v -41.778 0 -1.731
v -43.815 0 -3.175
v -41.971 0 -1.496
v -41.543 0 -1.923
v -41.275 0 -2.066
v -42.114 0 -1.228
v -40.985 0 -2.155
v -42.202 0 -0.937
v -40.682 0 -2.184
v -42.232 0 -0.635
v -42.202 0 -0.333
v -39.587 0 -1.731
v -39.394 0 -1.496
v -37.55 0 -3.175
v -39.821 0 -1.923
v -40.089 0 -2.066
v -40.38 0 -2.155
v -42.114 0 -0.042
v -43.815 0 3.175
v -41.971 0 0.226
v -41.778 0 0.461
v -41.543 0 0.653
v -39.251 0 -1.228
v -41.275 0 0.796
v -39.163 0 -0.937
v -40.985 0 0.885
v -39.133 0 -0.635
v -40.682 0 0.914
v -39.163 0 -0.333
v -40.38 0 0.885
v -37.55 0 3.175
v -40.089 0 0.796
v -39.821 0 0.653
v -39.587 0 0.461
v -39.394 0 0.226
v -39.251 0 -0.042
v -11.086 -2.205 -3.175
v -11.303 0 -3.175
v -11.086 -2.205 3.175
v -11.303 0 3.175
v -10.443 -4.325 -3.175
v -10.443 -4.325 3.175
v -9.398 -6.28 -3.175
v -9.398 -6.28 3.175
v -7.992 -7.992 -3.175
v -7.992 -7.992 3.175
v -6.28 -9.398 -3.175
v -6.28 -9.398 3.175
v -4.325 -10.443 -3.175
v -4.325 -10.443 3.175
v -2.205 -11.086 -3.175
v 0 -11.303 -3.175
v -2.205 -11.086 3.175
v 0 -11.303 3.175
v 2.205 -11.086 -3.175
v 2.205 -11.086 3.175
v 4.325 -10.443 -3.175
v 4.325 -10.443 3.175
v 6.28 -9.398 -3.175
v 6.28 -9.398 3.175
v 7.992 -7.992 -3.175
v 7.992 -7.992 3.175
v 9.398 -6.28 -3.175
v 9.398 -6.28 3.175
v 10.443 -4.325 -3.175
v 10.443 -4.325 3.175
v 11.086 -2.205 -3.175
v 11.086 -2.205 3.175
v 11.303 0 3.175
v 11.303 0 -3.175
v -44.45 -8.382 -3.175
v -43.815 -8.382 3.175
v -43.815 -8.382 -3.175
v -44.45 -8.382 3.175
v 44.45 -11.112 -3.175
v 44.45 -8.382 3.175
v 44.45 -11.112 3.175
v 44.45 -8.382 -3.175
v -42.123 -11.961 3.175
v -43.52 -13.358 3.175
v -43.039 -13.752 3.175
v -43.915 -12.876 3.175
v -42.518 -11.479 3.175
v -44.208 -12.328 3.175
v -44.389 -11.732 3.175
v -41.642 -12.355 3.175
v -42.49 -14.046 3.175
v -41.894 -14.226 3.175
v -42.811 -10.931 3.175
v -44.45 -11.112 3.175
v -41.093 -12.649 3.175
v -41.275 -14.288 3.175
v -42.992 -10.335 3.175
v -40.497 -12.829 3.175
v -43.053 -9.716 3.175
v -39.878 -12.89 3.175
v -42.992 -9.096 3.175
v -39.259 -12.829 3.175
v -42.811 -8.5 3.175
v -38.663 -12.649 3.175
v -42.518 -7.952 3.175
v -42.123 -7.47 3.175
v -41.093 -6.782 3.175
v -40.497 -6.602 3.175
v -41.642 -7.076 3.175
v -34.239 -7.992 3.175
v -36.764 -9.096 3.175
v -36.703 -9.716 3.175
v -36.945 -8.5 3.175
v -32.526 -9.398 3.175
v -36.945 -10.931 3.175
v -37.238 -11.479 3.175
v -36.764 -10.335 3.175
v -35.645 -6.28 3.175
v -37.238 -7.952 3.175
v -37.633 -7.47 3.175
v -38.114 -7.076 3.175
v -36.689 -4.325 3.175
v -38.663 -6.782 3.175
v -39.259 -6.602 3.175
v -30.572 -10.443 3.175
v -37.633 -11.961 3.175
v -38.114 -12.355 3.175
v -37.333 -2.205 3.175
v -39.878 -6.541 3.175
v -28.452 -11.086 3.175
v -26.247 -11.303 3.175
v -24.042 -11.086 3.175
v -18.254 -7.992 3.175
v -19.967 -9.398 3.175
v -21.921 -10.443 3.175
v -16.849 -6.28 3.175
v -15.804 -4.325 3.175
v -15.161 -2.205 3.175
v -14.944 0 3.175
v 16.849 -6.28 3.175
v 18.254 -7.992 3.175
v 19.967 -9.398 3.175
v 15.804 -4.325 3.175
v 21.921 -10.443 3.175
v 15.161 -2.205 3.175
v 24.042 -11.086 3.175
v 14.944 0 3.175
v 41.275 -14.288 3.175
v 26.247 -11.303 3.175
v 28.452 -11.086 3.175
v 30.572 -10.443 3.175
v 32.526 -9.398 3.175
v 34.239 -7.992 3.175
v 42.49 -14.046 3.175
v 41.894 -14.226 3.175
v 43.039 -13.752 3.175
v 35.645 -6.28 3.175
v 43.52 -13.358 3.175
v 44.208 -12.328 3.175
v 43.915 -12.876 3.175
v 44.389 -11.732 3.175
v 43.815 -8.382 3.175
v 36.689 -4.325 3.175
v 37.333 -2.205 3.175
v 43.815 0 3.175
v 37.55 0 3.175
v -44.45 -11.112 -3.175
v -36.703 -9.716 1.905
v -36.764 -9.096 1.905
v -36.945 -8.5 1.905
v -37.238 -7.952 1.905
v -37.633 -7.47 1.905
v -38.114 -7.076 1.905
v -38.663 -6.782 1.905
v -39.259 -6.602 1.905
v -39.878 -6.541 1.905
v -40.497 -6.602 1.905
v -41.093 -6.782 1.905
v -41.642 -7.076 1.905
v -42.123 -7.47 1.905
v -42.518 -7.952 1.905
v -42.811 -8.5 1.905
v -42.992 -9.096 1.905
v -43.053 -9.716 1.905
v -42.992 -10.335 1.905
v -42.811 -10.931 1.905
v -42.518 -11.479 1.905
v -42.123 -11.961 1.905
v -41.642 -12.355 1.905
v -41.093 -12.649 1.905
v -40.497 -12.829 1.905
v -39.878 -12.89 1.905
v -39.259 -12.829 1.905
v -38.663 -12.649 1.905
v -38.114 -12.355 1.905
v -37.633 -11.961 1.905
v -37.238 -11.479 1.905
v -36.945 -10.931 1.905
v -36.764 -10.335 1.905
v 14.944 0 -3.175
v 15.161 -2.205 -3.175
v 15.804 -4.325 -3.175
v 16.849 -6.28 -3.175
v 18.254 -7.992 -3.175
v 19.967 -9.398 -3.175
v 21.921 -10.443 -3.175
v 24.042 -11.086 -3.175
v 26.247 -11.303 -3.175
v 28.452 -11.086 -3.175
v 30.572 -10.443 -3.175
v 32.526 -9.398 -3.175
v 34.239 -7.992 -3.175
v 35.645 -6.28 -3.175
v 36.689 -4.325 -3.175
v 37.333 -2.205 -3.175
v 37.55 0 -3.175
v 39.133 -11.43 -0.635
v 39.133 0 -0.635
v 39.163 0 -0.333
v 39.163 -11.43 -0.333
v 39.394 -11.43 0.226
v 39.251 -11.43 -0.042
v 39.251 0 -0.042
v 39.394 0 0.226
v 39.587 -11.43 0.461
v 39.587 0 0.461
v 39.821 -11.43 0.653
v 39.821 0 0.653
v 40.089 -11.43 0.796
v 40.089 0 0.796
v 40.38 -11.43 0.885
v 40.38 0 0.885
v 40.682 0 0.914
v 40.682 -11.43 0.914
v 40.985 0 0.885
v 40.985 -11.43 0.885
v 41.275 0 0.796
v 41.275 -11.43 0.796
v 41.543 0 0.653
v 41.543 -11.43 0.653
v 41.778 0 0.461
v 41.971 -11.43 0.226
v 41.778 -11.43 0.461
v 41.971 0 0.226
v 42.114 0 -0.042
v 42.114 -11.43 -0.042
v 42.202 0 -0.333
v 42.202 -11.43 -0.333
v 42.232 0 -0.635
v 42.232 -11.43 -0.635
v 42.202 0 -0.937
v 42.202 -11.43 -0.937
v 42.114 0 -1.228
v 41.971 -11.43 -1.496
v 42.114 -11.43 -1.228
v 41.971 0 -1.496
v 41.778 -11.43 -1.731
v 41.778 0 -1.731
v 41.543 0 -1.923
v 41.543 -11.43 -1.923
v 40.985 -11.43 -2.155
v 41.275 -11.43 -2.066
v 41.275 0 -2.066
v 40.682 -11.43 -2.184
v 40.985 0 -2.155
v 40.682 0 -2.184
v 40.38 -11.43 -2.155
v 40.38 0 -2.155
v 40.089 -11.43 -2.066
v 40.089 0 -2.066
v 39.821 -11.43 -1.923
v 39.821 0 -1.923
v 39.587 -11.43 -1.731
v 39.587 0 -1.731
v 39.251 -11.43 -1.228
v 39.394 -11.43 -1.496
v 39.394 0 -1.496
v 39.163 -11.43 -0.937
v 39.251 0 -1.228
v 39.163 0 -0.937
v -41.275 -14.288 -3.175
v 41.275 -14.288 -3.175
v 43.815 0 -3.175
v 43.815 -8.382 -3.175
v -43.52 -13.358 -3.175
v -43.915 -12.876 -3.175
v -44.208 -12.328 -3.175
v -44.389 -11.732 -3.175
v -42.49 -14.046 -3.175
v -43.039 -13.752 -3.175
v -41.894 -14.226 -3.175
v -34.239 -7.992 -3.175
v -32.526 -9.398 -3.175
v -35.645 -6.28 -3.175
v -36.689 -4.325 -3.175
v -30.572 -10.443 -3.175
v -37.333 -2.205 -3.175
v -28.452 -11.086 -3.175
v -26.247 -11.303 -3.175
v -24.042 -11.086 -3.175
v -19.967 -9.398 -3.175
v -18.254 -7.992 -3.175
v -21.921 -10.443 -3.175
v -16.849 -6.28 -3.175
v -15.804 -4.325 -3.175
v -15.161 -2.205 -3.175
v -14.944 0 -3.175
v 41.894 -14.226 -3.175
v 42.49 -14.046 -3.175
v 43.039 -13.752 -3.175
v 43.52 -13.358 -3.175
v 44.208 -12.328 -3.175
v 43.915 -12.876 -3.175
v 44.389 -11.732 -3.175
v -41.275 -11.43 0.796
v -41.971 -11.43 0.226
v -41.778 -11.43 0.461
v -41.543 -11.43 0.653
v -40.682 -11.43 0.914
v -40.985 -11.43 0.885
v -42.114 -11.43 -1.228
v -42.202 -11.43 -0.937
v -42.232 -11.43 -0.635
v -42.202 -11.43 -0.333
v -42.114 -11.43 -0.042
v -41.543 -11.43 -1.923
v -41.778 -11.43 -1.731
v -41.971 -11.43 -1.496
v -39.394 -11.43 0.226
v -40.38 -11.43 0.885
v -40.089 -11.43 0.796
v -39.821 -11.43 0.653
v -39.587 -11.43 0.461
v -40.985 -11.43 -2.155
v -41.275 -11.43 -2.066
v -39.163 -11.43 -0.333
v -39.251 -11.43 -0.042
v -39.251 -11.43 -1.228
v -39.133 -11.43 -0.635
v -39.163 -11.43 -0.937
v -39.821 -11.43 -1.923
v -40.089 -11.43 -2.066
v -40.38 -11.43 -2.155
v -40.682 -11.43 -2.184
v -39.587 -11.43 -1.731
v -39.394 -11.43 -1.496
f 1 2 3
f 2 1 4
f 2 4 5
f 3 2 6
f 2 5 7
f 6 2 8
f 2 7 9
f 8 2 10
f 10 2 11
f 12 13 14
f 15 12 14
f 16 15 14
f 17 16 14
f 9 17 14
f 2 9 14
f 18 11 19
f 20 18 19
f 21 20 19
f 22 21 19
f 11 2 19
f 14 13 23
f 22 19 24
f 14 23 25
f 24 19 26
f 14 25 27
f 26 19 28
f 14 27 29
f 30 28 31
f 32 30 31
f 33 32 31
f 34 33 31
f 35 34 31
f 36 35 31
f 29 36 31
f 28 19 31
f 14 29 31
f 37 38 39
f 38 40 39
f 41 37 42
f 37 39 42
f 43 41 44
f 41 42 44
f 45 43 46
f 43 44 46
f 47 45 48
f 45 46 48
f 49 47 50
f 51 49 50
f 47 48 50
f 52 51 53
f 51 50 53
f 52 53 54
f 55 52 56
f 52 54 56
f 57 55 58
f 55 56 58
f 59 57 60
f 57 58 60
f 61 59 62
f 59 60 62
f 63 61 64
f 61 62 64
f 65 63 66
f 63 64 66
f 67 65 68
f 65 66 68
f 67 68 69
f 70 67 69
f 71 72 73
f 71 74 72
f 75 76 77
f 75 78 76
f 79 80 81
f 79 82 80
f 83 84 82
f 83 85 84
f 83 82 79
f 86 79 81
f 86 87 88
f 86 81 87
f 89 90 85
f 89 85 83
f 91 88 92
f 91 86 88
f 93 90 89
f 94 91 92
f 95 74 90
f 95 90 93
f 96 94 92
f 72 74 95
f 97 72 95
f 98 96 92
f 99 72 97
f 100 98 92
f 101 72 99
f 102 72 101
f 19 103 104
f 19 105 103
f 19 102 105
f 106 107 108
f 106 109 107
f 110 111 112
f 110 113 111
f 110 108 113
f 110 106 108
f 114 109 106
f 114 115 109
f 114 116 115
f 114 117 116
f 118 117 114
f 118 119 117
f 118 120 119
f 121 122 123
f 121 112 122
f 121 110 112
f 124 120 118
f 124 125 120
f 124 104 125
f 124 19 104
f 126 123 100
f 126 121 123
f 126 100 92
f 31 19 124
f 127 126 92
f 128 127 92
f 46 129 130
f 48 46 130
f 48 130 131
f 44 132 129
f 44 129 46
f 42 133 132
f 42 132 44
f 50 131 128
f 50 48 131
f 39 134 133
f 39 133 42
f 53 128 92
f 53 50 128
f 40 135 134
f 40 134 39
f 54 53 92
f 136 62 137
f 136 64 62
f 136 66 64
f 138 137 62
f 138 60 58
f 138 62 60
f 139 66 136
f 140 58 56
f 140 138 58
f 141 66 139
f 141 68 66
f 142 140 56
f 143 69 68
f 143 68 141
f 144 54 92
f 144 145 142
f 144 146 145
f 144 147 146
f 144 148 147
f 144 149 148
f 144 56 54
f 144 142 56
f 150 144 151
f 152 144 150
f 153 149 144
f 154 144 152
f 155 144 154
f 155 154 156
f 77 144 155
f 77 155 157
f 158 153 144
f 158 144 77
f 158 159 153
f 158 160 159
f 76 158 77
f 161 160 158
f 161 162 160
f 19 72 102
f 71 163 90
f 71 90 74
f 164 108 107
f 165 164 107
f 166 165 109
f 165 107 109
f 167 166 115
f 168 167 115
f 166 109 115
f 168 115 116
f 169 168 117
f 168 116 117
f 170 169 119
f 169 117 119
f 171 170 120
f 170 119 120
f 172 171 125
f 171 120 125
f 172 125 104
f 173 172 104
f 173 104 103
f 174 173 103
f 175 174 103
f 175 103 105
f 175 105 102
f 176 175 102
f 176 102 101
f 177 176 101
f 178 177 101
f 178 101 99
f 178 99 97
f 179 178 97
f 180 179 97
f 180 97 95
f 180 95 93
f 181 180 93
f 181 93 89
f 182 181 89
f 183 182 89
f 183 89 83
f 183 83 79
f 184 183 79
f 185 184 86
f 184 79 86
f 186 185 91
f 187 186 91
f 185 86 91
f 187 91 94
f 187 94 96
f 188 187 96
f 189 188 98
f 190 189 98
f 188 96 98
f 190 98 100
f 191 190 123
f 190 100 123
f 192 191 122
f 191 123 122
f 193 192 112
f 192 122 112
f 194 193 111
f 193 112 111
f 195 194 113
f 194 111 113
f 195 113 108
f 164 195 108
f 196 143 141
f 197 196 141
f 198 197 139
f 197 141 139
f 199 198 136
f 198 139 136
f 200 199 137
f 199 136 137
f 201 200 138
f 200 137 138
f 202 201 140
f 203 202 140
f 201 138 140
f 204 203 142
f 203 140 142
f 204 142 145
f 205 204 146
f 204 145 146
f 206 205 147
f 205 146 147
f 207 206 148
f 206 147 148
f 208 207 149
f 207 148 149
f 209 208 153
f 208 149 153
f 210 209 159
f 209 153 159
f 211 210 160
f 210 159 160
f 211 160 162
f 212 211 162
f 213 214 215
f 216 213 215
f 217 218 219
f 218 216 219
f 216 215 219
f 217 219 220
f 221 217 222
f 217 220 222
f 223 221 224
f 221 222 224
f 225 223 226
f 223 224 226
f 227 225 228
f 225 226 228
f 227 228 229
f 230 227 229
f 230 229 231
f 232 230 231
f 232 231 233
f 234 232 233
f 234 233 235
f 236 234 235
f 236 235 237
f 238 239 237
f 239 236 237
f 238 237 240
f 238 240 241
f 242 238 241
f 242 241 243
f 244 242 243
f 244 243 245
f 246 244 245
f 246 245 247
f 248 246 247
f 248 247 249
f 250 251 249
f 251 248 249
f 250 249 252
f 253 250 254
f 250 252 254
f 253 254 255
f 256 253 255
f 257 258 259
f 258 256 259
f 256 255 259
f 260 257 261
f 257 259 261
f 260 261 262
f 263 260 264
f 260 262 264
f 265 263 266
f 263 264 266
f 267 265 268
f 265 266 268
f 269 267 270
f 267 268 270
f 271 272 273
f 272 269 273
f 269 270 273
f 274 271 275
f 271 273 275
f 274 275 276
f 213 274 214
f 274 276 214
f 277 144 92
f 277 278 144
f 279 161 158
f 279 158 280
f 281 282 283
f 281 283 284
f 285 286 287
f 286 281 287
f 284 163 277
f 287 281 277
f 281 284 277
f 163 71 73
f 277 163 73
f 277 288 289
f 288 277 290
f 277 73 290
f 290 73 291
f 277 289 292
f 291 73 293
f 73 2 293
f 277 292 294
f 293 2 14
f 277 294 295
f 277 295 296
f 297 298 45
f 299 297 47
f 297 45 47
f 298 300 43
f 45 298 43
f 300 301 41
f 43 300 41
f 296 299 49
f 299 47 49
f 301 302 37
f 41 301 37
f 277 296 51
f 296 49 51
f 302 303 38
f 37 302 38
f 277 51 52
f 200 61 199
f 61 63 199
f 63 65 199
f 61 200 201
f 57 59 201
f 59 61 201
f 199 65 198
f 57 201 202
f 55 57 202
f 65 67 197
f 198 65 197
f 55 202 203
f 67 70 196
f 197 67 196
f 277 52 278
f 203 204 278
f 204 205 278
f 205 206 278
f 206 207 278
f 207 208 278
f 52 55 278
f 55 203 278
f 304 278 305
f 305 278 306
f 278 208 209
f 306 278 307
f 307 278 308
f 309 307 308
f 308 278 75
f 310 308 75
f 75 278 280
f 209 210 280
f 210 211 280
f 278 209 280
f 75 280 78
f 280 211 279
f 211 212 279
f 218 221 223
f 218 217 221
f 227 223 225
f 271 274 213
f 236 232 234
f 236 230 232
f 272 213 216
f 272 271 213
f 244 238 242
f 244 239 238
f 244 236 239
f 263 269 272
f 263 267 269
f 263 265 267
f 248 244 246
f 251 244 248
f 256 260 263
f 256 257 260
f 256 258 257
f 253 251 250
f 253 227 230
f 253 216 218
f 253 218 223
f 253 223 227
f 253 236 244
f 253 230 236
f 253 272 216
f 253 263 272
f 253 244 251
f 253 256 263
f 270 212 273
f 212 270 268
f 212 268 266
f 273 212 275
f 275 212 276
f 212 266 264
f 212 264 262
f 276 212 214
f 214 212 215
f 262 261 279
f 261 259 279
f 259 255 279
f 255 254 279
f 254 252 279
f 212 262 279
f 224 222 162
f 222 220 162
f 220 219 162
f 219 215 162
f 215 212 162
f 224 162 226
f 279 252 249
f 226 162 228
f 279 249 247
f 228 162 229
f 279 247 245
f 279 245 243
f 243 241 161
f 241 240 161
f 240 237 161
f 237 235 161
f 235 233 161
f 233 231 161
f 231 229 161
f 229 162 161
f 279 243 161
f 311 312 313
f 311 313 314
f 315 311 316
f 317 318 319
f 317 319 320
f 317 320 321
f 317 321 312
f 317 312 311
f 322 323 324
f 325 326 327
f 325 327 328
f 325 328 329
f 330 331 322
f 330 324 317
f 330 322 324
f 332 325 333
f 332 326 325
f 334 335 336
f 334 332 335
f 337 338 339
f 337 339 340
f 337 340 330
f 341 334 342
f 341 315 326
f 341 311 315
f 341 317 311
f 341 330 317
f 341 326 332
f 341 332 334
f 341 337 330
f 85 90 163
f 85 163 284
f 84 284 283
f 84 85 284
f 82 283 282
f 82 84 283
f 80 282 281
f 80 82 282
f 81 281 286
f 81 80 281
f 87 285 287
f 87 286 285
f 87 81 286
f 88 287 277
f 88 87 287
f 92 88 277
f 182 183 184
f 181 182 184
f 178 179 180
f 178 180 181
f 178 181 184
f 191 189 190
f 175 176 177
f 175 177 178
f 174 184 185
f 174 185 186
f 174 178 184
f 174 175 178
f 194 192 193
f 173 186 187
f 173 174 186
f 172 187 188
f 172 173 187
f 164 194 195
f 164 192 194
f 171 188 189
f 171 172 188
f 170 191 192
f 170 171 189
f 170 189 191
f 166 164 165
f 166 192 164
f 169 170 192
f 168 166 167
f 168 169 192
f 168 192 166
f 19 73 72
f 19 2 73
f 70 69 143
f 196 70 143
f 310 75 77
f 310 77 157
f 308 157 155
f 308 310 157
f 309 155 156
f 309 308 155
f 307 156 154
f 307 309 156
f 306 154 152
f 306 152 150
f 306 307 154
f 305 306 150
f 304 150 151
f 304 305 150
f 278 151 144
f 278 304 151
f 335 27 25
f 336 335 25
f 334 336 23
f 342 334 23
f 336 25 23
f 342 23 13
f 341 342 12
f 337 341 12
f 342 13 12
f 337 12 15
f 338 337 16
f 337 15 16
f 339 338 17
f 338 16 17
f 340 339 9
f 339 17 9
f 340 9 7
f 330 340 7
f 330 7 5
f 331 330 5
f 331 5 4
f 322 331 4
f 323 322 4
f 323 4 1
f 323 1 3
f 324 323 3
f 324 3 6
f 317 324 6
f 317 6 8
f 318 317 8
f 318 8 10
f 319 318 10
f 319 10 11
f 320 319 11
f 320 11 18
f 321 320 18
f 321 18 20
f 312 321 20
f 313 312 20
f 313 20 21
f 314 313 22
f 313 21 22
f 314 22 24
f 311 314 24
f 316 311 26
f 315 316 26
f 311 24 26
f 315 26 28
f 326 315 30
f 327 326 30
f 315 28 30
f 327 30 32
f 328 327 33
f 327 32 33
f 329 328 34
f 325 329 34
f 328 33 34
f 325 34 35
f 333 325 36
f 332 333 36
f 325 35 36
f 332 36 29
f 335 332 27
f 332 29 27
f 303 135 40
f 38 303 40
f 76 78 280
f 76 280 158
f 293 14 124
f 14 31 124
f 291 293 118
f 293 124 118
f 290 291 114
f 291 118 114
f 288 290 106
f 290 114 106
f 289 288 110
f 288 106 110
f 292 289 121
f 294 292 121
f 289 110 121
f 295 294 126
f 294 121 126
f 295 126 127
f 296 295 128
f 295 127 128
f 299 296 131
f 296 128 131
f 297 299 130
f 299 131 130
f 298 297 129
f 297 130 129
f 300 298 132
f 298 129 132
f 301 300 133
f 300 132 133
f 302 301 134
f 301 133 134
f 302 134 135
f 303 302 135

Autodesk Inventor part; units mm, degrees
ref_plane "YZ Plane" through (0, 0, 0) normal (1, 0, 0) x (0, 1, 0)
ref_plane "XZ Plane" through (0, 0, 0) normal (0, 1, 0) x (-1, 0, 0)
ref_plane "XY Plane" through (0, 0, 0) normal (0, 0, 1) x (1, 0, 0)
sketch "Sketch1" plane through (0, 0, 0) normal (0, 0, 1) x (1, 0, 0)
  line L0 (-44.45, 14.2875) -> (44.45, 14.2875)
  line L1 (44.45, 14.2875) -> (44.45, -14.2875)
  line L2 (44.45, -14.2875) -> (-44.45, -14.2875)
  line L3 (-44.45, -14.2875) -> (-44.45, 14.2875)
  point P0 (0, 0)
  dimension "d0" = 88.9
  dimension "d1" = 44.45
  dimension "d2" = 14.2875
  dimension "d3" = 28.575
extrude "Extrusion1" add sketch "Sketch1" along normal mid plane 6.35
sketch "Sketch2" plane through (0, 0, 3.175) normal (0, 0, 1) x (1, 0, 0)
  circle A0 centre (-26.2467, 0) radius 11.303
  circle A1 centre (0, 0) radius 11.303
  line L0 (44.45, -14.2875) -> (44.45, 14.2875) projected
  circle A2 centre (26.2467, 0) radius 11.303
  line L1 (-44.45, 14.2875) -> (-44.45, -14.2875) projected
  line L2 (-44.45, 0) -> (44.45, 0) construction
  line L3 (44.45, 14.2875) -> (-44.45, 14.2875) projected
  point P0 (0, 0)
  dimension "d6" = 22.606
  dimension "d9" = 22.606
  dimension "d11" = 22.606
  dimension "d14" = 26.2467
  dimension "d21" = 88.9
  dimension "d22" = 26.2467
  dimension "d50" = 0
sketch "Sketch4" plane through (-44.45, -14.2875, -3.175) normal (-1, 0, 0) x (0, 0, 1)
  line L0 (0, 0) -> (0, 28.575) projected
  line L1 (6.35, 28.575) -> (6.35, 0) projected
  line L2 (0, 22.6695) -> (6.35, 22.6695)
  line L3 (6.35, 22.6695) -> (6.35, 5.9055)
  line L4 (6.35, 5.9055) -> (0, 5.9055)
  line L5 (0, 5.9055) -> (0, 22.6695)
  point P0 (3.175, 14.2875)
  dimension "d30" = 8.382
  dimension "d31" = 16.764
extrude "Extrusion3" cut sketch "Sketch4" against normal blind 0.635
mirror "Mirror1" about plane through (0, 0, 0) normal (1, 0, 0) of "Extrusion3"
sketch "Sketch5" plane through (0, 0, 3.175) normal (0, 0, 1) x (1, 0, 0)
  circle A0 centre (0, 9.7155) radius 3.175 construction
  line L0 (44.45, 14.2875) -> (-44.45, 14.2875) projected
  line L1 (-15.0924, 20.454) -> (43.815, 0) construction
  line L2 (43.815, 8.382) -> (43.815, -8.382) projected
  circle A1 centre (3.4073, 19.5285) radius 3.175 construction
  circle A2 centre (39.243, 1.5875) radius 3.175 construction
  circle A3 centre (-39.243, 28.8396) radius 3.175 construction
  line L3 (-43.815, 8.382) -> (-43.815, -8.382) projected
  circle A4 centre (39.878, 9.7155) radius 3.175
  circle A5 centre (-39.878, -9.7155) radius 3.175
  line L4 (44.45, 8.382) -> (44.45, 14.2875) projected
  line L5 (-44.45, -14.2875) -> (44.45, -14.2875) projected
  line L6 (-44.45, -14.2875) -> (-44.45, -8.382) projected
  point P0 (0, 0)
  dimension "d34" = 6.35
  dimension "d35" = 4.572
  dimension "d53" = 6.35
  dimension "d54" = 6.35
  dimension "d55" = 4.572
  dimension "d56" = 4.572
  dimension "d57" = 12.7
  dimension "d58" = 6.35
  dimension "d59" = 6.35
  dimension "d60" = 4.572
  dimension "d61" = 4.572
  dimension "d62" = 4.572
  dimension "d63" = 4.572
extrude "Extrusion4" cut sketch "Sketch5" against normal blind 1.27
sketch "Sketch7" plane through (-44.45, -14.2875, 3.175) normal (0, -1, 0) x (1, 0, 0)
  line L0 (30.48, -14.605) -> (58.42, -14.605)
  line L1 (58.42, -14.605) -> (58.42, 8.255)
  line L2 (58.42, 8.255) -> (30.48, 8.255)
  line L3 (30.48, 8.255) -> (30.48, -14.605)
  point P0 (44.45, -3.175)
  dimension "d39" = 27.94
  dimension "d40" = 22.86
  dimension "d41" = 11.43
  dimension "d42" = 13.97
extrude "Extrusion5" [suppressed]
sketch "Sketch8" plane through (0, 0, -3.175) normal (0, 0, -1) x (-1, 0, 0)
  line L0 (-44.45, 14.2875) -> (44.45, 14.2875) projected
  line L1 (15.6718, 14.2875) -> (-15.6718, 14.2875)
  line L2 (-15.6718, 14.2875) -> (-15.6718, 52.3875)
  line L3 (-15.6718, 52.3875) -> (15.6718, 52.3875)
  line L4 (15.6718, 52.3875) -> (15.6718, 14.2875)
  point P0 (0, 0)
  dimension "d45" = 31.3436
  dimension "d46" = 38.1
  dimension "d47" = 15.6718
extrude "Extrusion6" add sketch "Sketch8" against normal up to surface (6.35 mm away)
extrude "Extrusion7" cut sketch "Sketch2" against normal blind 25.4
sketch "Sketch9" plane through (-15.6718, 52.3875, -3.175) normal (0, 1, 0) x (1, 0, 0)
  line L0 (-28.7782, -6.35) -> (60.1218, -6.35) projected
  line L1 (3.1718, -6.35) -> (28.1718, -6.35)
  line L2 (28.1718, -6.35) -> (28.1718, -3.175)
  line L3 (28.1718, -3.175) -> (3.1718, -3.175)
  line L4 (3.1718, -3.175) -> (3.1718, -6.35)
  point P0 (15.6718, -3.175)
  dimension "d64" = 3.175
  dimension "d65" = 25
  dimension "d66" = 12.5
extrude "Extrusion8" cut sketch "Sketch9" against normal blind 0.9
sketch "Sketch13" plane through (0, 0, 3.175) normal (0, 0, 1) x (1, 0, 0)
  line L0 (-15.6718, 52.3875) -> (-12.5, 52.3875) projected
  line L1 (-12.5, 52.3875) -> (12.5, 52.3875) projected
  line L2 (12.5, 52.3875) -> (15.6718, 52.3875) projected
  line L3 (15.6718, 52.3875) -> (15.6718, 14.2875) projected
  line L4 (-15.6718, 14.2875) -> (-15.6718, 52.3875) projected
  line L5 (-15.6718, 14.2875) -> (-44.45, 14.2875) projected
  line L6 (44.45, 14.2875) -> (15.6718, 14.2875) projected
  line L7 (44.45, 8.382) -> (44.45, 14.2875) projected
  line L8 (-44.45, 14.2875) -> (-44.45, 8.382) projected
  line L9 (-44.45, 8.382) -> (-43.815, 8.382) projected
  line L10 (43.815, 8.382) -> (44.45, 8.382) projected
  line L11 (-43.815, 8.382) -> (-43.815, 0)
  line L12 (-43.815, 8.382) -> (-43.815, -8.382) projected
  line L13 (-43.815, 0) -> (43.815, 0)
  line L14 (43.815, 8.382) -> (43.815, -8.382) projected
  line L15 (43.815, 0) -> (43.815, 8.382)
  point P0 (0, 0)
extrude "Extrusion11" cut sketch "Sketch13" against normal through all
sketch "Sketch14" plane through (-43.815, 0, 3.175) normal (0, 1, 0) x (1, 0, 0)
  line L0 (7.112, 0) -> (0.762, 0) projected
  line L1 (7.112, 1.27) -> (0.762, 1.27) projected
  line L2 (6.2653, 6.35) -> (6.2653, 0) projected
  line L3 (0, 6.35) -> (6.2653, 6.35) projected
  line L4 (0, 0) -> (0, 6.35) projected
  line L5 (6.2653, 0) -> (0, 0) projected
  circle A0 centre (3.1327, 3.81) radius 1.5494
  point P0 (43.815, 3.175)
  dimension "d84" = 3.0988
  dimension "d85" = 6.2653
  dimension "d86" = 5.08
  dimension "d87" = 2.54
  dimension "d88" = 3.1327
extrude "Extrusion12" cut sketch "Sketch14" against normal blind 11.43 contours A0
mirror "Mirror3" about plane through (0, 0, 0) normal (1, 0, 0) of "Extrusion12"
thread "Thread3" size "5-40 UNC" class "2B" standard "ANSI Unified Screw Threads" full length
thread "Thread4" size "5-40 UNC" class "2B" standard "ANSI Unified Screw Threads" full length
fillet "Fillet1" radius 3.175 2 edges at (44.45, -14.2875, 0) (-44.45, -14.2875, 0)
equation "\"d1\" = 0.5 * d0"
equation "\"d2\" = 0.5 * d3"
equation "\"d9\" = d7"
equation "\"d11\" = d9"
equation "\"d22\" = d14"
equation "\"d30\" = 0.5 * d31"
equation "\"d41\" = 0.5 * d40"
equation "\"d42\" = 0.5 * d39"
equation "\"d47\" = 0.5 * d45"
equation "\"d66\" = 0.5 * d65"
equation "\"d87\" = 0.5 * d86"
equation "\"d88\" = 0.5 * d85"
equation "\"d7\" = d6"
properties part number "Tube Holder Halve 3" material "Aluminum 6061-AHC"
